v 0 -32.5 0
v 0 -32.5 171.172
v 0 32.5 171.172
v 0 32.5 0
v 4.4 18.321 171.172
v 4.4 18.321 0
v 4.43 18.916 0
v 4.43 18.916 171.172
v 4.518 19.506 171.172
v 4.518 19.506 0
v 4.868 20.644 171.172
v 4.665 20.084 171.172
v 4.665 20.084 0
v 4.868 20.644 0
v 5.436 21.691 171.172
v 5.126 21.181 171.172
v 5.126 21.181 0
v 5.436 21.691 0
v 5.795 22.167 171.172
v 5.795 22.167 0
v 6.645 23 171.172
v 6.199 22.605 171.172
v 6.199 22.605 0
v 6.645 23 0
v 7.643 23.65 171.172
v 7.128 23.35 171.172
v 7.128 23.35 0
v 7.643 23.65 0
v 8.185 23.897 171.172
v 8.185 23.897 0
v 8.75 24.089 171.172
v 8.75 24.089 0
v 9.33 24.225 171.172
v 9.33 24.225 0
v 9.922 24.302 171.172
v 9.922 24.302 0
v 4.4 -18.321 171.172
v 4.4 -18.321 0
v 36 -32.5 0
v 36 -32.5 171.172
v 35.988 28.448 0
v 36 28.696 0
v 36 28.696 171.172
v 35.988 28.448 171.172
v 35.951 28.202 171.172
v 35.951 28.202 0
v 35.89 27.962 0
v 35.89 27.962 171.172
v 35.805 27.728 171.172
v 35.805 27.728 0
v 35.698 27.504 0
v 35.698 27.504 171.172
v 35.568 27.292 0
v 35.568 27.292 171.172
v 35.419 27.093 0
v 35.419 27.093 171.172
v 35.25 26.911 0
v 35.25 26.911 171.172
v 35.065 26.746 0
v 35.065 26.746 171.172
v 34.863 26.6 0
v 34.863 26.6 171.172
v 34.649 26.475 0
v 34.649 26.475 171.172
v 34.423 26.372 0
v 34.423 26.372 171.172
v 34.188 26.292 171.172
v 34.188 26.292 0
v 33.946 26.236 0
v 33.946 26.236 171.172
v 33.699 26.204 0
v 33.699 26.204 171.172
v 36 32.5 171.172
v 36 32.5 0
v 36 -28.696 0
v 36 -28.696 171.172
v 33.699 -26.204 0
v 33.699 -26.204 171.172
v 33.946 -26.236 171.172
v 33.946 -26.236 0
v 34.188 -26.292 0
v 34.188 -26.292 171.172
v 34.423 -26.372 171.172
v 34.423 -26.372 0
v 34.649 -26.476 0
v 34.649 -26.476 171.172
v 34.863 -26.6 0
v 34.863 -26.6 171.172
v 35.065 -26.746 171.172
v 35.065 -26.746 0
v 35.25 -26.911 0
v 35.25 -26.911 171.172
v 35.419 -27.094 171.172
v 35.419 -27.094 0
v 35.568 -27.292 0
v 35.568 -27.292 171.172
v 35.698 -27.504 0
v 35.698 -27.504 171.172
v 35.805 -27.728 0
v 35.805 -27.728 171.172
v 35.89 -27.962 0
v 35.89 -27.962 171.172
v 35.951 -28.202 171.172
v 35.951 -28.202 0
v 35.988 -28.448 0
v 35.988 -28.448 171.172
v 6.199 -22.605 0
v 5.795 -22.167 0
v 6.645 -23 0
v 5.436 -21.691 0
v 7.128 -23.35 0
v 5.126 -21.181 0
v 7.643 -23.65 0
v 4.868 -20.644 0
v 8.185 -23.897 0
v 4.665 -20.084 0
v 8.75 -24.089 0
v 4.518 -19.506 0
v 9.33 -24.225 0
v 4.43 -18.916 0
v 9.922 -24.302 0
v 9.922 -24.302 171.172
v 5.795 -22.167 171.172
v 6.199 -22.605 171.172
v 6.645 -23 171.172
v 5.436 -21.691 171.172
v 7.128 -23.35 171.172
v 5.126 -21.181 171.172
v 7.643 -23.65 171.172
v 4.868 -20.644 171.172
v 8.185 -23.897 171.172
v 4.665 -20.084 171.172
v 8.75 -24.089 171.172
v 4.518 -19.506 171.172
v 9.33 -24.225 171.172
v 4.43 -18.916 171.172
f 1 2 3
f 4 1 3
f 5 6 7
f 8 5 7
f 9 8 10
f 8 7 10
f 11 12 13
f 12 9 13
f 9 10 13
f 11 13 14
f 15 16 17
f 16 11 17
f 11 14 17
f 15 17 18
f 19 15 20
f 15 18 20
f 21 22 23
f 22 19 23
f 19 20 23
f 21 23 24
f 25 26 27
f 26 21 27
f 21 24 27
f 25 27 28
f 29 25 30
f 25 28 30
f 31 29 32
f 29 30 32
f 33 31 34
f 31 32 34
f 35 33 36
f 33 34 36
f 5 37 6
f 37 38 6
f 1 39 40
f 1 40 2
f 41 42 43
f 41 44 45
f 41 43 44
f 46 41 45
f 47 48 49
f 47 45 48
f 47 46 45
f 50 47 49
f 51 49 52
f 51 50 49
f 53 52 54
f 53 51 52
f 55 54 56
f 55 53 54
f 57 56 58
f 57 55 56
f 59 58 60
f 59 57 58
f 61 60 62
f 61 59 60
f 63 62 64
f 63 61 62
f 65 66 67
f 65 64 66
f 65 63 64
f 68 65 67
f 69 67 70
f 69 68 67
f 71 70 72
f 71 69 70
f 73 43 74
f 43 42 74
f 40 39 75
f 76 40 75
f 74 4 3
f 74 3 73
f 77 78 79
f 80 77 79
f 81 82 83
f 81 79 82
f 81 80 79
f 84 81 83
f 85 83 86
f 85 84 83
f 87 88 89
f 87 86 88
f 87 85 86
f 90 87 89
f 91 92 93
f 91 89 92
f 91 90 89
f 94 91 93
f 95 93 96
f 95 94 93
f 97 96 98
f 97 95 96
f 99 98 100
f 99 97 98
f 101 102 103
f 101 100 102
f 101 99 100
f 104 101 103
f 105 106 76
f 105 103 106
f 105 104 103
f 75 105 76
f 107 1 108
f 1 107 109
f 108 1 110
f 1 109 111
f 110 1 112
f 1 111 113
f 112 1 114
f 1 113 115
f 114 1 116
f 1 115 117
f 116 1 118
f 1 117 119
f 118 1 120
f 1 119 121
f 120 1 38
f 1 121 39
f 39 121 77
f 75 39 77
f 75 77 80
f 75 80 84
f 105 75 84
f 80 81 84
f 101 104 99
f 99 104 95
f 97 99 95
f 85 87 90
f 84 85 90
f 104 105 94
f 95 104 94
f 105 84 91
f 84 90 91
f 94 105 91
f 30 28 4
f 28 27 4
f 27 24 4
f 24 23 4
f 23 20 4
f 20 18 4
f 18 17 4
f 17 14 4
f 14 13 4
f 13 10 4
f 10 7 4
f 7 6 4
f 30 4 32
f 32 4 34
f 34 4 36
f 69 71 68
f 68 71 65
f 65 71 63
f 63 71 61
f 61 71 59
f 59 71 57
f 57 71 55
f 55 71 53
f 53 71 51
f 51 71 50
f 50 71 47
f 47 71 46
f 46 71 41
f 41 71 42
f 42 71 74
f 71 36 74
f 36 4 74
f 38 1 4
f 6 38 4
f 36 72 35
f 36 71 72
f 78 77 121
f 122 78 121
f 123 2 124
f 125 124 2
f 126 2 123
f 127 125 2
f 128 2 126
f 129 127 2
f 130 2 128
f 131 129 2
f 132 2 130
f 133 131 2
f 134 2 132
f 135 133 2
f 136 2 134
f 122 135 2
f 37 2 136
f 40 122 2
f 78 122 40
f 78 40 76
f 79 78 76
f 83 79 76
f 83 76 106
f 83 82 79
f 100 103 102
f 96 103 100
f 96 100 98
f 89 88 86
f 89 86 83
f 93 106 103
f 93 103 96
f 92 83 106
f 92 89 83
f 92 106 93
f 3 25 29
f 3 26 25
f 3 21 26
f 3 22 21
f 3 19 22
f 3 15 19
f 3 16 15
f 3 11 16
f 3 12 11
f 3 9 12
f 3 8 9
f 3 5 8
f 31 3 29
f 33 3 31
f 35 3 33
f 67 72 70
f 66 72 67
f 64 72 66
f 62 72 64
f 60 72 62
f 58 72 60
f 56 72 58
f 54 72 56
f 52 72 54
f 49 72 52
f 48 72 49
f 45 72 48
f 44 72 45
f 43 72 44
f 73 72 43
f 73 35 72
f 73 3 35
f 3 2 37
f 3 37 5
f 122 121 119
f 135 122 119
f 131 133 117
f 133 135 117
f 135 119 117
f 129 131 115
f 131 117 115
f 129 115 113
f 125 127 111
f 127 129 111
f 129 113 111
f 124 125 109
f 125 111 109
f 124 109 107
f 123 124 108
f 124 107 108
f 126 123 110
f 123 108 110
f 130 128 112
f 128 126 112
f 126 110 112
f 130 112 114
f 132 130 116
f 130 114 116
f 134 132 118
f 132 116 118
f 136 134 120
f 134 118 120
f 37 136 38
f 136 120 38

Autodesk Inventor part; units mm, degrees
ref_plane "Начальная плоскость" through (0, 0, 0) normal (0, 0, 1) x (1, 0, 0)
ref_plane "Конечная плоскость" through (0, 0, 171.172) normal (0, 0, 1) x (1, 0, 0)
sketch "Эскиз" plane through (0, 0, 0) normal (0, 0, 1) x (1, 0, 0)
  line L0 (36, -32.5) -> (0, -32.5)
  line L1 (36, -32.5) -> (36, -28.696)
  line L2 (33.6994, -26.2039) -> (9.9215, -24.3017)
  line L3 (4.4, -18.3208) -> (4.4, 18.3208)
  line L4 (33.6994, 26.2039) -> (9.9215, 24.3017)
  line L5 (36, 28.696) -> (36, 32.5)
  line L6 (0, 32.5) -> (36, 32.5)
  line L7 (0, -32.5) -> (0, 32.5)
  arc A0 (4.4, -18.3208) -> (9.9215, -24.3017) centre (10.4, -18.3208) ccw
  arc A1 (9.9215, 24.3017) -> (4.4, 18.3208) centre (10.4, 18.3208) ccw
  arc A2 (36, -28.696) -> (33.6994, -26.2039) centre (33.5, -28.696) ccw
  arc A3 (33.6994, 26.2039) -> (36, 28.696) centre (33.5, 28.696) ccw
  line L8 (0, 45.5) -> (0, -45.5) construction
  line L9 (-7.2974, 0) -> (43.7847, 0) construction
  point P0 (36, -26.388)
  point P1 (4.4, -23.86)
  point P2 (4.4, 23.86)
  point P3 (36, 26.388)
  dimension "d3" = 36
  dimension "d5" = 4.4
  dimension "d7" = 65
  dimension "d9" = 8.64
  dimension "d11" = 8.64
  dimension "d13" = 6.112
  dimension "d15" = 6.112
  dimension "d22" = 6
  dimension "d23" = 2.5
  dimension "d24" = 32.5
  dimension "d25" = 0
extrude "Тело" add sketch "Эскиз" along normal up to surface (171.172 mm away) from surface at 0
sketch "Sketch3" plane through (0, 0, 0) normal (0, 0, 1) x (1, 0, 0)
  line L0 (0, 0) -> (10, 0)
ref_plane "Work Plane7" through (0, 0, 0) normal (0, -1, 0) x (1, 0, 0)
sketch "Sketch4" plane through (0, 0, 0) normal (0, -1, 0) x (1, 0, 0)
  line L0 (-2, 0) -> (12, 0)
  line L1 (-2, 171.172) -> (12, 171.172)
  dimension "d29" = 171.172
ref_plane "РабПлоскость8" through (169.3883, -32.5, 171.172) normal (0, 0, 1) x (1, 0, 0)
split "Разделение1" plane through (169.3883, -32.5, 171.172) removes the side toward (0, 0, 1)
equation "\"d3\" = b"
equation "\"d5\" = t1"
equation "\"d7\" = ParH"
equation "\"d9\" = msp_x1 + t2"
equation "\"d11\" = msp_x1 + t2"
equation "\"d13\" = -msp_x2 + t2"
equation "\"d15\" = -msp_x2 + t2"
equation "\"d22\" = R"
equation "\"d23\" = R1"
equation "\"d24\" = 0.5 * d7"
equation "\"d16\" = G_L"
equation "\"R1\" = 2.5"
equation "\"R\" = 6"
equation "\"t1\" = 4.4"
equation "\"t2\" = 7.2"
equation "\"ParH\" = 65"
equation "\"b\" = 36"
equation "\"msp_x1\" = 0.04 * b"
equation "\"msp_x2\" = -0.08 * t1 + 0.04 * b"
equation "\"G_L\" = d29"
equation "\"ex\" = 0"
equation "\"G_OFFSET_START\" = 0"
equation "\"G_OFFSET_END\" = -36"
equation "\"d27\" = G_OFFSET_END + B_L"
equation "\"B_L\" = 207.172"
properties part number "Швеллер 6.5U-171,17 ГОСТ 8240-97" material "Сталь, мягкая"
